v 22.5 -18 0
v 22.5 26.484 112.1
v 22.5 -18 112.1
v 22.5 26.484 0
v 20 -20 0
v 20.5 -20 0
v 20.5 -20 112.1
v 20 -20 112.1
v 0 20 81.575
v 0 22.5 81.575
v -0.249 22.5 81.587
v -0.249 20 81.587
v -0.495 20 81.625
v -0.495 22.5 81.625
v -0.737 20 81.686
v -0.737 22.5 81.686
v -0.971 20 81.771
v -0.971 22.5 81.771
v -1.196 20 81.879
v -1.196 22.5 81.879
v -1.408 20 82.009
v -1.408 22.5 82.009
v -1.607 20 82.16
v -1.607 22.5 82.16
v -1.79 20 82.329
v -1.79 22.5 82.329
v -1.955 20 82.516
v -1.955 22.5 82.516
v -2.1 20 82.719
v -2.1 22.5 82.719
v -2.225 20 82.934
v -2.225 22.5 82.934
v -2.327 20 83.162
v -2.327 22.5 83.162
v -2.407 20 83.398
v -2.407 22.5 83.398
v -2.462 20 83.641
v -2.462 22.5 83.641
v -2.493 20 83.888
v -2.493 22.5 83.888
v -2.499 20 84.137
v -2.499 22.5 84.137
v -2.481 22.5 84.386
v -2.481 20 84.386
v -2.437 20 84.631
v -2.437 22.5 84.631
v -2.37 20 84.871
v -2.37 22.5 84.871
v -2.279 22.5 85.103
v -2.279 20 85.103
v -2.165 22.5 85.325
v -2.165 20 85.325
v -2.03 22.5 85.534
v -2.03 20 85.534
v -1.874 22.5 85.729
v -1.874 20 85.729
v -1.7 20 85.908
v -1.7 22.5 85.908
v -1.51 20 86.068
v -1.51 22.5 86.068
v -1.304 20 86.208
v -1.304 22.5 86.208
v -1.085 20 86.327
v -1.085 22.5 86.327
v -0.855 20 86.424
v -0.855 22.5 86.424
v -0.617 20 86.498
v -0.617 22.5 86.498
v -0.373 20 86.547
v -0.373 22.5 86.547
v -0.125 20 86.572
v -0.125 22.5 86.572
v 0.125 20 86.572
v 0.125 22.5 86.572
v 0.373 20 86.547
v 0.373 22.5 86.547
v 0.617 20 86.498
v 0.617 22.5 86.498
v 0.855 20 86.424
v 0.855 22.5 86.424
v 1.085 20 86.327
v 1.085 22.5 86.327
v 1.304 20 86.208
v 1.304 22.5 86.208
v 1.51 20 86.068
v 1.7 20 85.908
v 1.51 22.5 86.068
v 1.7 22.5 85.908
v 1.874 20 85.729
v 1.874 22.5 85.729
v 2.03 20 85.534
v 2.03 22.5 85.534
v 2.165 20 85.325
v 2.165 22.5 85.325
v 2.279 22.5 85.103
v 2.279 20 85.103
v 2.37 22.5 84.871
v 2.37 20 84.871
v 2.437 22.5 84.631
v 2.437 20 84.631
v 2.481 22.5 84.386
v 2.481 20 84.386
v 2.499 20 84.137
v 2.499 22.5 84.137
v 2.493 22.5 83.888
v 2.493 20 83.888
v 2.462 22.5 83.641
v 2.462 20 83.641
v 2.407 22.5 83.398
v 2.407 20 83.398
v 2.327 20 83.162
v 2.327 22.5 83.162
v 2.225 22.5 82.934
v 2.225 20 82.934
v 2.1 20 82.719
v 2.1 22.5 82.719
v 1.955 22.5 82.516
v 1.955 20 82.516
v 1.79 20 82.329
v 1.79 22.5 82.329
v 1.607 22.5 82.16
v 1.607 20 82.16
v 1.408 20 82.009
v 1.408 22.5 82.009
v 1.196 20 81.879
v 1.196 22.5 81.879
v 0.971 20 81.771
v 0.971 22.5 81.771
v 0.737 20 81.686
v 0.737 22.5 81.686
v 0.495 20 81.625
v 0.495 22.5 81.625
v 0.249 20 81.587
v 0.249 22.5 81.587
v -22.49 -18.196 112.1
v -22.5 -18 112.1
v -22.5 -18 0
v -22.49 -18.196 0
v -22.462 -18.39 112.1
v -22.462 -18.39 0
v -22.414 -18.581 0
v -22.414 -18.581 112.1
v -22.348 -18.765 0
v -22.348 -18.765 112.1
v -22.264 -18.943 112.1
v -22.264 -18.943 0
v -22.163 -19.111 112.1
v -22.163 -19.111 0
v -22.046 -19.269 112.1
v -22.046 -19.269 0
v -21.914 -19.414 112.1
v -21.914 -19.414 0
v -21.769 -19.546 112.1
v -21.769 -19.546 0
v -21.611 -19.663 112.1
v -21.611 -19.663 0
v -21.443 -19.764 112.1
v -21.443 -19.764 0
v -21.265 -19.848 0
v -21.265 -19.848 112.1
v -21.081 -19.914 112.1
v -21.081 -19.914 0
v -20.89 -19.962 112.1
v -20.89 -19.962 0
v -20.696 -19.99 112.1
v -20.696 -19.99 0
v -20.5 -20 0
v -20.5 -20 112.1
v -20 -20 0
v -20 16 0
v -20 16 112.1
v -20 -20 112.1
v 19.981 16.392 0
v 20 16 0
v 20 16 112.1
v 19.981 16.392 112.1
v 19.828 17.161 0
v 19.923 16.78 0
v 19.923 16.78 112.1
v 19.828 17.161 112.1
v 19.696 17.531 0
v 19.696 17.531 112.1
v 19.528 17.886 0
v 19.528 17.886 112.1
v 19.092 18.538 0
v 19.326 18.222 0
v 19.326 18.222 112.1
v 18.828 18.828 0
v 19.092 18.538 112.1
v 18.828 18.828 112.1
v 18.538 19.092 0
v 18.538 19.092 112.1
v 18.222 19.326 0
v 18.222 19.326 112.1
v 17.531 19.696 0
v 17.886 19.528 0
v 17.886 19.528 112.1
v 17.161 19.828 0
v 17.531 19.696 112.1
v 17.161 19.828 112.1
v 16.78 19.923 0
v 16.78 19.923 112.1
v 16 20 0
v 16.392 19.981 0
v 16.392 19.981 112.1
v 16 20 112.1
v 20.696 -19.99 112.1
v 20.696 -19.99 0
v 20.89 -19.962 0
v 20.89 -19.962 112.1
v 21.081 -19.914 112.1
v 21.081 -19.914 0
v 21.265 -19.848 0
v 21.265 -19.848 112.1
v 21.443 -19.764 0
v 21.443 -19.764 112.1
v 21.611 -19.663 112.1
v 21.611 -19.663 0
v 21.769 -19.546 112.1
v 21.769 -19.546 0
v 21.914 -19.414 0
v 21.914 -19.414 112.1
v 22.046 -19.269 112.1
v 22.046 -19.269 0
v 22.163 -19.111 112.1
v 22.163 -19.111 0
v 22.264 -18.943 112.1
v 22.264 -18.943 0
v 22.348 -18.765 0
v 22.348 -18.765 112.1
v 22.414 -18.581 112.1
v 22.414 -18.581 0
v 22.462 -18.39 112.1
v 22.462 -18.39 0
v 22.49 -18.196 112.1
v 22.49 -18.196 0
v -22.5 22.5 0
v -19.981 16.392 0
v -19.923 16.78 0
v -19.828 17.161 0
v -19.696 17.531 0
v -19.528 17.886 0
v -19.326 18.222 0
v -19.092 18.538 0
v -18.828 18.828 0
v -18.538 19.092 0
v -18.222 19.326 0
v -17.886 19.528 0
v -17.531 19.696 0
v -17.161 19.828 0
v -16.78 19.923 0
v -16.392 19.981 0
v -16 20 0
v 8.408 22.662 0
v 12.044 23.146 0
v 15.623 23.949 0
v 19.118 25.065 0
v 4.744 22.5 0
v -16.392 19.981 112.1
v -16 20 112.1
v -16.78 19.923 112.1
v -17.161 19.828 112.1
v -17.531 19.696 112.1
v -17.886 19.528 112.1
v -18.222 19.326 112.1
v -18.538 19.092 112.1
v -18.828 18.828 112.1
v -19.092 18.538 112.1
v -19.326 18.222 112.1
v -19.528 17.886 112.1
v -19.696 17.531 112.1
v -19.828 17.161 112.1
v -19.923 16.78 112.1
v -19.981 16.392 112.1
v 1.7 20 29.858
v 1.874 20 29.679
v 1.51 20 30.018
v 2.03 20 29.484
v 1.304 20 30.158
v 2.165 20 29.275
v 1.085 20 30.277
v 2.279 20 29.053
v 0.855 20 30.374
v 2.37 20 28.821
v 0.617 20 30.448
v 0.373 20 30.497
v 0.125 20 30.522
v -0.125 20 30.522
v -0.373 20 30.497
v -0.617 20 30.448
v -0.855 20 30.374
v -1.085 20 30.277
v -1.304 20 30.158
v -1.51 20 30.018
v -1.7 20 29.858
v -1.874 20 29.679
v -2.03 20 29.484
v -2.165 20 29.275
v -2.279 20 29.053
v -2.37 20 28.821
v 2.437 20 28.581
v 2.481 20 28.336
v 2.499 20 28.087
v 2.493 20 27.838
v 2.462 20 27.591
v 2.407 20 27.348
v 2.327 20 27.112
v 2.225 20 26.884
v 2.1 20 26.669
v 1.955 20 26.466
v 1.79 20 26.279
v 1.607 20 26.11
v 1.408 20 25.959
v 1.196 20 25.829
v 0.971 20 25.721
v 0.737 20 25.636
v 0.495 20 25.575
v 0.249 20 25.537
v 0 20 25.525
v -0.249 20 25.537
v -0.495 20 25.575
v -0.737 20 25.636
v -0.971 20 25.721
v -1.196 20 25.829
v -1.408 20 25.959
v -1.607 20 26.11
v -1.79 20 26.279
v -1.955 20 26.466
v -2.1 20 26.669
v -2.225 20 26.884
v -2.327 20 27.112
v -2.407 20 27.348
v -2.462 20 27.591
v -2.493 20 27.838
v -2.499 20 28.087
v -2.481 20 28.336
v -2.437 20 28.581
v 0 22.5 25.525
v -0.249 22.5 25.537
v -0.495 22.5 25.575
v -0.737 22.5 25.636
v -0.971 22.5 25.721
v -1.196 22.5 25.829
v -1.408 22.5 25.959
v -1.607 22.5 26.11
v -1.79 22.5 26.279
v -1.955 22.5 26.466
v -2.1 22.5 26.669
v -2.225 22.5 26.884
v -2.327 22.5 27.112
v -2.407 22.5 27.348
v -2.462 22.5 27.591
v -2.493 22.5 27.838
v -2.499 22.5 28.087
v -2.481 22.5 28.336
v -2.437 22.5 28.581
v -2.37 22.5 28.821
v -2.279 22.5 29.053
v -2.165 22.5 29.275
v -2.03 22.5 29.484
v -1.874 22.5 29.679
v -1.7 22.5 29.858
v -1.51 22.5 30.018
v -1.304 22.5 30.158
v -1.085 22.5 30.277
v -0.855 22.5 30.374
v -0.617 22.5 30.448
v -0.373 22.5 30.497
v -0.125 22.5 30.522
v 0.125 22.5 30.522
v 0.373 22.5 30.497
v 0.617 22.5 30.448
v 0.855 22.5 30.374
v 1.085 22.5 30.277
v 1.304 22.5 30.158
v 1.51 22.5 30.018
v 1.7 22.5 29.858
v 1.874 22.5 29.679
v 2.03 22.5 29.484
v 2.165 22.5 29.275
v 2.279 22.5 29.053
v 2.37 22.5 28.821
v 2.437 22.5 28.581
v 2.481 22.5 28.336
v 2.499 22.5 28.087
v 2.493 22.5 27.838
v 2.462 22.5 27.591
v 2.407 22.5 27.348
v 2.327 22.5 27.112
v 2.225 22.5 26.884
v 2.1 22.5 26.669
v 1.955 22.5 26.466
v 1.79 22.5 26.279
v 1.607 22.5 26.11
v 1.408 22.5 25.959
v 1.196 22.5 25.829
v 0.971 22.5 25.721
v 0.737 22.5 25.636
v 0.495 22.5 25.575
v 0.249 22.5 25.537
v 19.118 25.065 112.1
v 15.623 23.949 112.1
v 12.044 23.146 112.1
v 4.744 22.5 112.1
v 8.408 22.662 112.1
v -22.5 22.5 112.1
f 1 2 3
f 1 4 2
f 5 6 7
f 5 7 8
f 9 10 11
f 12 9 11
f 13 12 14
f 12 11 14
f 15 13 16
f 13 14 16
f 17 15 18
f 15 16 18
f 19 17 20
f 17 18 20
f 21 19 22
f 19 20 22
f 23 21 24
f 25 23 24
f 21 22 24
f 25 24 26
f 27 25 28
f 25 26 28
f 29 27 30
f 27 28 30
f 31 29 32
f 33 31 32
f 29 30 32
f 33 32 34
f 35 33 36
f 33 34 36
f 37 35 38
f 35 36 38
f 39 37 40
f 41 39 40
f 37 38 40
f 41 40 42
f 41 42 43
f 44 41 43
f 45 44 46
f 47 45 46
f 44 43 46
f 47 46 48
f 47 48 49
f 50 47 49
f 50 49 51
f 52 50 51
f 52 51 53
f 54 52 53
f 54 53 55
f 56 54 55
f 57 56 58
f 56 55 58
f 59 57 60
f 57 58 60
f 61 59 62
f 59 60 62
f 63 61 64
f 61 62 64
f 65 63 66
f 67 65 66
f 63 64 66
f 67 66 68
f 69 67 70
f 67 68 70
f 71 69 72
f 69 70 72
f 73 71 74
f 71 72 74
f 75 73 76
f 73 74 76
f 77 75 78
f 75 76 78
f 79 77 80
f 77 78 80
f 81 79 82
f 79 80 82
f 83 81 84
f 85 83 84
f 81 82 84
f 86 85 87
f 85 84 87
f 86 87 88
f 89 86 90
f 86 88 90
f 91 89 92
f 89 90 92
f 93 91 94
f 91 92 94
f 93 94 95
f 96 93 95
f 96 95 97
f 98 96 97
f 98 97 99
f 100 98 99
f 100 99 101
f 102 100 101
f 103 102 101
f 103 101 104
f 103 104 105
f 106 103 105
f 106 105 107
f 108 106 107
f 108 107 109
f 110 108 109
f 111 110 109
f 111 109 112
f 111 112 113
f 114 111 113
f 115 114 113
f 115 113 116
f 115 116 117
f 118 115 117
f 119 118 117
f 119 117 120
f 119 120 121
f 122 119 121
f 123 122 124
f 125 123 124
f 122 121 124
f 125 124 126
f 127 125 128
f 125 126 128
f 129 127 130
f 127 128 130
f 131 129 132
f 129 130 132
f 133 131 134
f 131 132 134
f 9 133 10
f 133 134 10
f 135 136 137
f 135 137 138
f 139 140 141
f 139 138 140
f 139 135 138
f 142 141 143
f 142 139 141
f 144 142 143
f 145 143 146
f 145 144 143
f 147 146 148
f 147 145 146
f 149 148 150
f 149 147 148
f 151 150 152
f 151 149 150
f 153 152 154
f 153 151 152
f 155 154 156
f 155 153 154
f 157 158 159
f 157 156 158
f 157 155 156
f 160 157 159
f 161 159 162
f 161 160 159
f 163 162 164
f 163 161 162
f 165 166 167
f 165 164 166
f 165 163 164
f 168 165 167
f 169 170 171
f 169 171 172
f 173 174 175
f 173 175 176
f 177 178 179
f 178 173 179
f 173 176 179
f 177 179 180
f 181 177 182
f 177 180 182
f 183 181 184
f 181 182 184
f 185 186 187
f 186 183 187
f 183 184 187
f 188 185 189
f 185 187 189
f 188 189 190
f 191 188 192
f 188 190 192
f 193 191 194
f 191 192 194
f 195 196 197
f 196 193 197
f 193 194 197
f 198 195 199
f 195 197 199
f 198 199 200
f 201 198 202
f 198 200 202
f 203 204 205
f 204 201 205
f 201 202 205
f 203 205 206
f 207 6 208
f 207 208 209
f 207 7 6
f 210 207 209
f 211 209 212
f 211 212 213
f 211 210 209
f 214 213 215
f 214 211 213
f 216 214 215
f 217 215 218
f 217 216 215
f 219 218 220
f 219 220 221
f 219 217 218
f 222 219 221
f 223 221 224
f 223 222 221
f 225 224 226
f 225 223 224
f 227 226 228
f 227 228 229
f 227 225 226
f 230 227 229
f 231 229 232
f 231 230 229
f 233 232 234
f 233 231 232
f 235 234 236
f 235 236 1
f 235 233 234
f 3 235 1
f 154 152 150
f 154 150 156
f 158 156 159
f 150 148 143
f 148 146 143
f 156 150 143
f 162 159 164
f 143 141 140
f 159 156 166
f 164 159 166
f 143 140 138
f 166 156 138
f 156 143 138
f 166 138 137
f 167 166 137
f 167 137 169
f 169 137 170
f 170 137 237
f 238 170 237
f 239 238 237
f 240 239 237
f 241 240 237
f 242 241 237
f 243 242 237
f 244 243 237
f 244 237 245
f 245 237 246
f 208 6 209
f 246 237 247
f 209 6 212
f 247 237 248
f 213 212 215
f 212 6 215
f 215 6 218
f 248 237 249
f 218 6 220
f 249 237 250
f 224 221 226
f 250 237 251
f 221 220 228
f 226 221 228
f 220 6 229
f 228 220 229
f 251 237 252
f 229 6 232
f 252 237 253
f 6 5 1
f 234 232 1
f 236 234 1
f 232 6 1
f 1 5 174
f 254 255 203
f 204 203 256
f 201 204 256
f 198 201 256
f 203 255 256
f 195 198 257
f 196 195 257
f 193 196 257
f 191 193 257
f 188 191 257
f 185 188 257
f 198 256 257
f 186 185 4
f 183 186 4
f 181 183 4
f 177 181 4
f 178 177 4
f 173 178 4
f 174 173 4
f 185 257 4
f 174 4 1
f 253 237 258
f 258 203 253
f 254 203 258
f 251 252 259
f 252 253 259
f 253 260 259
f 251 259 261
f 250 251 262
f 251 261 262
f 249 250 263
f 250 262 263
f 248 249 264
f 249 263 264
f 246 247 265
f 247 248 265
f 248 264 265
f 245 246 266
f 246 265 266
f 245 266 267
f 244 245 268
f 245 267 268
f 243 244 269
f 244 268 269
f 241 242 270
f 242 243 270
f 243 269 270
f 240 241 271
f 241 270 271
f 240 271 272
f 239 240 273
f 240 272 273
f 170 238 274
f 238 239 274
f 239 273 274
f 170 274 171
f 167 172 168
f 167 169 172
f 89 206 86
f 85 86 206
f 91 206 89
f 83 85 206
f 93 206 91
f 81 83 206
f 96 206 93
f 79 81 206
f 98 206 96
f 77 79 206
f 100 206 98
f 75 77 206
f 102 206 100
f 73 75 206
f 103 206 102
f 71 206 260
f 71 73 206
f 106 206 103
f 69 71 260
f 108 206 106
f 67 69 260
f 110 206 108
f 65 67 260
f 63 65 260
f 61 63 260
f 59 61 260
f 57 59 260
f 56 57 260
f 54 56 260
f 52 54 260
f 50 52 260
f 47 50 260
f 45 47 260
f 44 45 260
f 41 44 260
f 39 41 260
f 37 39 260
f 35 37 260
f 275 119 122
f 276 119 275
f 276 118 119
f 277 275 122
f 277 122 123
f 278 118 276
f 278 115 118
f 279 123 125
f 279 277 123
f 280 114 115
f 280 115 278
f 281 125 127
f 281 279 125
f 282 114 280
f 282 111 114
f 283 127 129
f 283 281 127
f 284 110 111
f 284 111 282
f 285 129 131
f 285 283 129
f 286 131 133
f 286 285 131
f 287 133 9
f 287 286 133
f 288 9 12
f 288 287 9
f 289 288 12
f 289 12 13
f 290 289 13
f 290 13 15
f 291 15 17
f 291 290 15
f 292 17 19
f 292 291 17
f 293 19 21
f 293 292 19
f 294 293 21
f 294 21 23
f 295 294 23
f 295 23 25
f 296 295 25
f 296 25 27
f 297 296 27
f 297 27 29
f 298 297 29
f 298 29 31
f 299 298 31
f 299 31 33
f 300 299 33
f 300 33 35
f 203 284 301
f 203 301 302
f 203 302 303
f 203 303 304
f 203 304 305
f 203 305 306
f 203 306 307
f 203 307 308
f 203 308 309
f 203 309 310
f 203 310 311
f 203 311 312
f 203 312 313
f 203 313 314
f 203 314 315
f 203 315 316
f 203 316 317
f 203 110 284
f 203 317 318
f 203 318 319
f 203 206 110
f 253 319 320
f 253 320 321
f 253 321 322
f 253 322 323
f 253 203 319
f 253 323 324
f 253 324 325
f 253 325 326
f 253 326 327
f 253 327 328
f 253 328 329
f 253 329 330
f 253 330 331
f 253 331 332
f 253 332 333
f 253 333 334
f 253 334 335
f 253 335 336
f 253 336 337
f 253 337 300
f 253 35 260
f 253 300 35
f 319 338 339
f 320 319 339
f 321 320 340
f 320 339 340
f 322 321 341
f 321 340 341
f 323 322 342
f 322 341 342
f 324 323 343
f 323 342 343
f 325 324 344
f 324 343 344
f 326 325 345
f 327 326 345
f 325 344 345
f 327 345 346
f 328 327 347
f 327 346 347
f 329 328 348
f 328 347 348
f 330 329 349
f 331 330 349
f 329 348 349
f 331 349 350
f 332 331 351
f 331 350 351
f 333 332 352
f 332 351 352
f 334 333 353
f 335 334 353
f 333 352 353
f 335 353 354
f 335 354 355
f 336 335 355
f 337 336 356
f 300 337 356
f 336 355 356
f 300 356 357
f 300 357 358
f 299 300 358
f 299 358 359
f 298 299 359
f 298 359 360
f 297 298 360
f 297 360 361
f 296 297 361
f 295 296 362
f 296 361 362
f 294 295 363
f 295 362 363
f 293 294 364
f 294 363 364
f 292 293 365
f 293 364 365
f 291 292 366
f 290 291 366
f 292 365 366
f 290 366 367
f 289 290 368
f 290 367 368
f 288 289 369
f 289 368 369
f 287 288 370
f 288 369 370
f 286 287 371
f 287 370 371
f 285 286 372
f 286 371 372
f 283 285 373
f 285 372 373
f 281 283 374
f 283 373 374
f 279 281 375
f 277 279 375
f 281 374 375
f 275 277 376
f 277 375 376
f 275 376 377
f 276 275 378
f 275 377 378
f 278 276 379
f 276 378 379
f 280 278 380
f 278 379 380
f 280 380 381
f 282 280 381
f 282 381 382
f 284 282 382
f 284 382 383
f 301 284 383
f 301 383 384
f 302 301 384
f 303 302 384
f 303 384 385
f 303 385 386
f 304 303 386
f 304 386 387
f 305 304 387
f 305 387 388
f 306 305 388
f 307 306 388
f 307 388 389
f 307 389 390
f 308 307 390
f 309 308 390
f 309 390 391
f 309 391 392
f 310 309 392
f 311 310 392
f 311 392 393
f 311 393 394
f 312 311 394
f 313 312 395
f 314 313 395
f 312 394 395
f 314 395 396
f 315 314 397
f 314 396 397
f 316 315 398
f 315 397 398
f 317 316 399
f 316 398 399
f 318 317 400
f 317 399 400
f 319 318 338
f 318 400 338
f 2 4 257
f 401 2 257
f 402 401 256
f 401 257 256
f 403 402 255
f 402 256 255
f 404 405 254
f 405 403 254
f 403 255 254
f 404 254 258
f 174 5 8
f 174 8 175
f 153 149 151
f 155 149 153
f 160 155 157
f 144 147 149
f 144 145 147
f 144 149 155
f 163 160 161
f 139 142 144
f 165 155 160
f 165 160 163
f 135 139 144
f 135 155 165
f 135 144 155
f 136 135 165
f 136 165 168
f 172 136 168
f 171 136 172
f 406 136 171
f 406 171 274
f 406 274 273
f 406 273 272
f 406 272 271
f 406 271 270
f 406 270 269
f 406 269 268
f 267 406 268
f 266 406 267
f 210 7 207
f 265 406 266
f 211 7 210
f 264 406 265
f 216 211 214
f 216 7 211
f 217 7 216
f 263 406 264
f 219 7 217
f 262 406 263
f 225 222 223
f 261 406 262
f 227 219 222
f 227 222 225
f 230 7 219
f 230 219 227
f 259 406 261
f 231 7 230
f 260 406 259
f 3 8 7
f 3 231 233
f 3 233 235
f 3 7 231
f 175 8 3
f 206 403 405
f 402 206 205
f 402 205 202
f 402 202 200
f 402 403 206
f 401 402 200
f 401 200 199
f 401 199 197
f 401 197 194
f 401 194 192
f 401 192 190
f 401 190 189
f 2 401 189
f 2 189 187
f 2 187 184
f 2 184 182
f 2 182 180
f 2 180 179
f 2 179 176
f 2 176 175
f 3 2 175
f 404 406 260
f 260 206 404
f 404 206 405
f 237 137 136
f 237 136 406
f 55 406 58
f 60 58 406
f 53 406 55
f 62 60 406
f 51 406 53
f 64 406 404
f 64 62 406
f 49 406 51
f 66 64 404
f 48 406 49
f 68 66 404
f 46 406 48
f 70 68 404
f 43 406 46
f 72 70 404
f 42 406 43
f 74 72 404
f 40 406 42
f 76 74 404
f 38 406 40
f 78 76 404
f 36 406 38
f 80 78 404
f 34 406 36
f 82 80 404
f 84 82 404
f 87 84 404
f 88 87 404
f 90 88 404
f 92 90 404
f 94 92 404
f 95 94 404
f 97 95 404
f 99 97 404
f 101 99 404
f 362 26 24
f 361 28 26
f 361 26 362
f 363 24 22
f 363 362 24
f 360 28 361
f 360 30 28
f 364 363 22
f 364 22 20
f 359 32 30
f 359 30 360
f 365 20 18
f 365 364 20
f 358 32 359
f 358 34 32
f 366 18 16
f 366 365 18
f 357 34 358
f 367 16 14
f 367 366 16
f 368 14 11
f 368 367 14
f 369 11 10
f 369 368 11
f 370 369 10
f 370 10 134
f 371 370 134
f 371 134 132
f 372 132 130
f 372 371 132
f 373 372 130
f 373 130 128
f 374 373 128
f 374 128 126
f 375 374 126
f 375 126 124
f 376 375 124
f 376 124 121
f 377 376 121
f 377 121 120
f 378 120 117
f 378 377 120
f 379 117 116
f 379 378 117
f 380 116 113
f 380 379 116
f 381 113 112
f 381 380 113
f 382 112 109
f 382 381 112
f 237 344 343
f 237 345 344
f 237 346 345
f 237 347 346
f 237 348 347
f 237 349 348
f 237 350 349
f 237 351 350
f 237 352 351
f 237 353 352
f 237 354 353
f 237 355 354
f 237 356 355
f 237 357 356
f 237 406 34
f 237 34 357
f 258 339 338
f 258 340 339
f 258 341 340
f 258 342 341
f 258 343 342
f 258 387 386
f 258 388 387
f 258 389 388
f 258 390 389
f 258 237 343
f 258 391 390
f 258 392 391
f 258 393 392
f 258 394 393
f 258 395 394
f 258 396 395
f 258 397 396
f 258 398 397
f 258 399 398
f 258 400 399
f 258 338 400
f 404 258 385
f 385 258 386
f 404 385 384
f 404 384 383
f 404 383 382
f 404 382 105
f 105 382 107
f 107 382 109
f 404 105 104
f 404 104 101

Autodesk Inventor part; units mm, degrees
ref_plane "YZ Plane" through (0, 0, 0) normal (1, 0, 0) x (0, 1, 0)
ref_plane "XZ Plane" through (0, 0, 0) normal (0, 1, 0) x (-1, 0, 0)
ref_plane "XY Plane" through (0, 0, 0) normal (0, 0, 1) x (1, 0, 0)
sketch "Sketch1" plane through (0, 0, 0) normal (0, 0, 1) x (1, 0, 0)
  line L0 (-20, -20) -> (20, -20)
  line L1 (20, -20) -> (20, 20)
  line L2 (20, 20) -> (-20, 20)
  line L3 (-20, 20) -> (-20, -20)
  line L4 (-20, -20) -> (20, 20) construction
  line L5 (20, -20) -> (-20, 20) construction
  line L6 (-22.5, 22.5) -> (22.5, 22.5)
  line L7 (22.5, 22.5) -> (22.5, -20)
  line L8 (22.5, -20) -> (-22.5, -20)
  line L9 (-22.5, -20) -> (-22.5, 22.5)
  line L10 (-33.9631, 22.5) -> (42.8206, 22.5) construction
  line L11 (-22.5, 22.5) -> (4.744, 22.5) construction
  line L12 (4.744, 22.5) -> (22.5, 22.5) construction
  line L13 (22.5, 22.5) -> (22.5, 26.484) construction
  line L14 (22.5, 26.484) -> (4.744, 26.484) construction
  line L15 (4.744, 26.484) -> (4.744, 22.5) construction
  arc A0 (4.744, 22.5) -> (22.5, 26.484) centre (4.7442, 64.059) ccw
  line L16 (22.5, 26.484) -> (22.5, 22.5)
  line L17 (22.5, 22.5) -> (4.744, 22.5)
  point P0 (0, 0)
  dimension "d0" = 40
  dimension "d1" = 40
  dimension "d2" = 2.5
  dimension "d3" = 42.5
  dimension "d4" = 2.5
  dimension "d5" = 2.5
  dimension "d6" = 27.244
  dimension "d7" = 3.984
  dimension "d8" = 41.559
extrude "Extrusion1" add sketch "Sketch1" along normal blind 112.1 contours L8 L9 L6 L7 L1 L2 L3 | L6 A0 L16
sketch "Sketch2" plane through (-20, 20, 0) normal (0, -1, 0) x (1, 0, 0)
  line L0 (0, 0) -> (0, 112.1) construction
  line L1 (40, 112.1) -> (40, 0) construction
  line L2 (0, 112.1) -> (40, 112.1) construction
  line L3 (40, 112.1) -> (40, 0) construction
  line L4 (40, 0) -> (0, 0) construction
  line L5 (0, 0) -> (0, 112.1) construction
  line L6 (20, 112.1) -> (20, 0) construction
  line L7 (24.744, 0) -> (24.744, 112.1) construction
  line L8 (42.5, 0) -> (40, 0) construction
  line L9 (0, 112.1) -> (40, 0) construction
  line L10 (0, 0) -> (40, 112.1) construction
  line L11 (40, 56.05) -> (0, 112.1) construction
  line L12 (0, 56.05) -> (40, 112.1) construction
  line L13 (0, 56.05) -> (40, 0) construction
  line L14 (40, 56.05) -> (0, 0) construction
  point P0 (20, 28.025)
  point P1 (20, 84.075)
hole "Hole1" at (0, 20, 28.025) at (0, 20, 84.075) direction (0, 1, 0) diameter 5 depth 8 tip angle 118
fillet "Fillet1" radius 4 2 edges at (20, 20, 56.05) (-20, 20, 56.05)
fillet "Fillet2" radius 2 2 edges at (-22.5, -20, 56.05) (22.5, -20, 56.05)
equation "\"d4\" = d2"
equation "\"d5\" = d4"
properties part number "display_holder"
